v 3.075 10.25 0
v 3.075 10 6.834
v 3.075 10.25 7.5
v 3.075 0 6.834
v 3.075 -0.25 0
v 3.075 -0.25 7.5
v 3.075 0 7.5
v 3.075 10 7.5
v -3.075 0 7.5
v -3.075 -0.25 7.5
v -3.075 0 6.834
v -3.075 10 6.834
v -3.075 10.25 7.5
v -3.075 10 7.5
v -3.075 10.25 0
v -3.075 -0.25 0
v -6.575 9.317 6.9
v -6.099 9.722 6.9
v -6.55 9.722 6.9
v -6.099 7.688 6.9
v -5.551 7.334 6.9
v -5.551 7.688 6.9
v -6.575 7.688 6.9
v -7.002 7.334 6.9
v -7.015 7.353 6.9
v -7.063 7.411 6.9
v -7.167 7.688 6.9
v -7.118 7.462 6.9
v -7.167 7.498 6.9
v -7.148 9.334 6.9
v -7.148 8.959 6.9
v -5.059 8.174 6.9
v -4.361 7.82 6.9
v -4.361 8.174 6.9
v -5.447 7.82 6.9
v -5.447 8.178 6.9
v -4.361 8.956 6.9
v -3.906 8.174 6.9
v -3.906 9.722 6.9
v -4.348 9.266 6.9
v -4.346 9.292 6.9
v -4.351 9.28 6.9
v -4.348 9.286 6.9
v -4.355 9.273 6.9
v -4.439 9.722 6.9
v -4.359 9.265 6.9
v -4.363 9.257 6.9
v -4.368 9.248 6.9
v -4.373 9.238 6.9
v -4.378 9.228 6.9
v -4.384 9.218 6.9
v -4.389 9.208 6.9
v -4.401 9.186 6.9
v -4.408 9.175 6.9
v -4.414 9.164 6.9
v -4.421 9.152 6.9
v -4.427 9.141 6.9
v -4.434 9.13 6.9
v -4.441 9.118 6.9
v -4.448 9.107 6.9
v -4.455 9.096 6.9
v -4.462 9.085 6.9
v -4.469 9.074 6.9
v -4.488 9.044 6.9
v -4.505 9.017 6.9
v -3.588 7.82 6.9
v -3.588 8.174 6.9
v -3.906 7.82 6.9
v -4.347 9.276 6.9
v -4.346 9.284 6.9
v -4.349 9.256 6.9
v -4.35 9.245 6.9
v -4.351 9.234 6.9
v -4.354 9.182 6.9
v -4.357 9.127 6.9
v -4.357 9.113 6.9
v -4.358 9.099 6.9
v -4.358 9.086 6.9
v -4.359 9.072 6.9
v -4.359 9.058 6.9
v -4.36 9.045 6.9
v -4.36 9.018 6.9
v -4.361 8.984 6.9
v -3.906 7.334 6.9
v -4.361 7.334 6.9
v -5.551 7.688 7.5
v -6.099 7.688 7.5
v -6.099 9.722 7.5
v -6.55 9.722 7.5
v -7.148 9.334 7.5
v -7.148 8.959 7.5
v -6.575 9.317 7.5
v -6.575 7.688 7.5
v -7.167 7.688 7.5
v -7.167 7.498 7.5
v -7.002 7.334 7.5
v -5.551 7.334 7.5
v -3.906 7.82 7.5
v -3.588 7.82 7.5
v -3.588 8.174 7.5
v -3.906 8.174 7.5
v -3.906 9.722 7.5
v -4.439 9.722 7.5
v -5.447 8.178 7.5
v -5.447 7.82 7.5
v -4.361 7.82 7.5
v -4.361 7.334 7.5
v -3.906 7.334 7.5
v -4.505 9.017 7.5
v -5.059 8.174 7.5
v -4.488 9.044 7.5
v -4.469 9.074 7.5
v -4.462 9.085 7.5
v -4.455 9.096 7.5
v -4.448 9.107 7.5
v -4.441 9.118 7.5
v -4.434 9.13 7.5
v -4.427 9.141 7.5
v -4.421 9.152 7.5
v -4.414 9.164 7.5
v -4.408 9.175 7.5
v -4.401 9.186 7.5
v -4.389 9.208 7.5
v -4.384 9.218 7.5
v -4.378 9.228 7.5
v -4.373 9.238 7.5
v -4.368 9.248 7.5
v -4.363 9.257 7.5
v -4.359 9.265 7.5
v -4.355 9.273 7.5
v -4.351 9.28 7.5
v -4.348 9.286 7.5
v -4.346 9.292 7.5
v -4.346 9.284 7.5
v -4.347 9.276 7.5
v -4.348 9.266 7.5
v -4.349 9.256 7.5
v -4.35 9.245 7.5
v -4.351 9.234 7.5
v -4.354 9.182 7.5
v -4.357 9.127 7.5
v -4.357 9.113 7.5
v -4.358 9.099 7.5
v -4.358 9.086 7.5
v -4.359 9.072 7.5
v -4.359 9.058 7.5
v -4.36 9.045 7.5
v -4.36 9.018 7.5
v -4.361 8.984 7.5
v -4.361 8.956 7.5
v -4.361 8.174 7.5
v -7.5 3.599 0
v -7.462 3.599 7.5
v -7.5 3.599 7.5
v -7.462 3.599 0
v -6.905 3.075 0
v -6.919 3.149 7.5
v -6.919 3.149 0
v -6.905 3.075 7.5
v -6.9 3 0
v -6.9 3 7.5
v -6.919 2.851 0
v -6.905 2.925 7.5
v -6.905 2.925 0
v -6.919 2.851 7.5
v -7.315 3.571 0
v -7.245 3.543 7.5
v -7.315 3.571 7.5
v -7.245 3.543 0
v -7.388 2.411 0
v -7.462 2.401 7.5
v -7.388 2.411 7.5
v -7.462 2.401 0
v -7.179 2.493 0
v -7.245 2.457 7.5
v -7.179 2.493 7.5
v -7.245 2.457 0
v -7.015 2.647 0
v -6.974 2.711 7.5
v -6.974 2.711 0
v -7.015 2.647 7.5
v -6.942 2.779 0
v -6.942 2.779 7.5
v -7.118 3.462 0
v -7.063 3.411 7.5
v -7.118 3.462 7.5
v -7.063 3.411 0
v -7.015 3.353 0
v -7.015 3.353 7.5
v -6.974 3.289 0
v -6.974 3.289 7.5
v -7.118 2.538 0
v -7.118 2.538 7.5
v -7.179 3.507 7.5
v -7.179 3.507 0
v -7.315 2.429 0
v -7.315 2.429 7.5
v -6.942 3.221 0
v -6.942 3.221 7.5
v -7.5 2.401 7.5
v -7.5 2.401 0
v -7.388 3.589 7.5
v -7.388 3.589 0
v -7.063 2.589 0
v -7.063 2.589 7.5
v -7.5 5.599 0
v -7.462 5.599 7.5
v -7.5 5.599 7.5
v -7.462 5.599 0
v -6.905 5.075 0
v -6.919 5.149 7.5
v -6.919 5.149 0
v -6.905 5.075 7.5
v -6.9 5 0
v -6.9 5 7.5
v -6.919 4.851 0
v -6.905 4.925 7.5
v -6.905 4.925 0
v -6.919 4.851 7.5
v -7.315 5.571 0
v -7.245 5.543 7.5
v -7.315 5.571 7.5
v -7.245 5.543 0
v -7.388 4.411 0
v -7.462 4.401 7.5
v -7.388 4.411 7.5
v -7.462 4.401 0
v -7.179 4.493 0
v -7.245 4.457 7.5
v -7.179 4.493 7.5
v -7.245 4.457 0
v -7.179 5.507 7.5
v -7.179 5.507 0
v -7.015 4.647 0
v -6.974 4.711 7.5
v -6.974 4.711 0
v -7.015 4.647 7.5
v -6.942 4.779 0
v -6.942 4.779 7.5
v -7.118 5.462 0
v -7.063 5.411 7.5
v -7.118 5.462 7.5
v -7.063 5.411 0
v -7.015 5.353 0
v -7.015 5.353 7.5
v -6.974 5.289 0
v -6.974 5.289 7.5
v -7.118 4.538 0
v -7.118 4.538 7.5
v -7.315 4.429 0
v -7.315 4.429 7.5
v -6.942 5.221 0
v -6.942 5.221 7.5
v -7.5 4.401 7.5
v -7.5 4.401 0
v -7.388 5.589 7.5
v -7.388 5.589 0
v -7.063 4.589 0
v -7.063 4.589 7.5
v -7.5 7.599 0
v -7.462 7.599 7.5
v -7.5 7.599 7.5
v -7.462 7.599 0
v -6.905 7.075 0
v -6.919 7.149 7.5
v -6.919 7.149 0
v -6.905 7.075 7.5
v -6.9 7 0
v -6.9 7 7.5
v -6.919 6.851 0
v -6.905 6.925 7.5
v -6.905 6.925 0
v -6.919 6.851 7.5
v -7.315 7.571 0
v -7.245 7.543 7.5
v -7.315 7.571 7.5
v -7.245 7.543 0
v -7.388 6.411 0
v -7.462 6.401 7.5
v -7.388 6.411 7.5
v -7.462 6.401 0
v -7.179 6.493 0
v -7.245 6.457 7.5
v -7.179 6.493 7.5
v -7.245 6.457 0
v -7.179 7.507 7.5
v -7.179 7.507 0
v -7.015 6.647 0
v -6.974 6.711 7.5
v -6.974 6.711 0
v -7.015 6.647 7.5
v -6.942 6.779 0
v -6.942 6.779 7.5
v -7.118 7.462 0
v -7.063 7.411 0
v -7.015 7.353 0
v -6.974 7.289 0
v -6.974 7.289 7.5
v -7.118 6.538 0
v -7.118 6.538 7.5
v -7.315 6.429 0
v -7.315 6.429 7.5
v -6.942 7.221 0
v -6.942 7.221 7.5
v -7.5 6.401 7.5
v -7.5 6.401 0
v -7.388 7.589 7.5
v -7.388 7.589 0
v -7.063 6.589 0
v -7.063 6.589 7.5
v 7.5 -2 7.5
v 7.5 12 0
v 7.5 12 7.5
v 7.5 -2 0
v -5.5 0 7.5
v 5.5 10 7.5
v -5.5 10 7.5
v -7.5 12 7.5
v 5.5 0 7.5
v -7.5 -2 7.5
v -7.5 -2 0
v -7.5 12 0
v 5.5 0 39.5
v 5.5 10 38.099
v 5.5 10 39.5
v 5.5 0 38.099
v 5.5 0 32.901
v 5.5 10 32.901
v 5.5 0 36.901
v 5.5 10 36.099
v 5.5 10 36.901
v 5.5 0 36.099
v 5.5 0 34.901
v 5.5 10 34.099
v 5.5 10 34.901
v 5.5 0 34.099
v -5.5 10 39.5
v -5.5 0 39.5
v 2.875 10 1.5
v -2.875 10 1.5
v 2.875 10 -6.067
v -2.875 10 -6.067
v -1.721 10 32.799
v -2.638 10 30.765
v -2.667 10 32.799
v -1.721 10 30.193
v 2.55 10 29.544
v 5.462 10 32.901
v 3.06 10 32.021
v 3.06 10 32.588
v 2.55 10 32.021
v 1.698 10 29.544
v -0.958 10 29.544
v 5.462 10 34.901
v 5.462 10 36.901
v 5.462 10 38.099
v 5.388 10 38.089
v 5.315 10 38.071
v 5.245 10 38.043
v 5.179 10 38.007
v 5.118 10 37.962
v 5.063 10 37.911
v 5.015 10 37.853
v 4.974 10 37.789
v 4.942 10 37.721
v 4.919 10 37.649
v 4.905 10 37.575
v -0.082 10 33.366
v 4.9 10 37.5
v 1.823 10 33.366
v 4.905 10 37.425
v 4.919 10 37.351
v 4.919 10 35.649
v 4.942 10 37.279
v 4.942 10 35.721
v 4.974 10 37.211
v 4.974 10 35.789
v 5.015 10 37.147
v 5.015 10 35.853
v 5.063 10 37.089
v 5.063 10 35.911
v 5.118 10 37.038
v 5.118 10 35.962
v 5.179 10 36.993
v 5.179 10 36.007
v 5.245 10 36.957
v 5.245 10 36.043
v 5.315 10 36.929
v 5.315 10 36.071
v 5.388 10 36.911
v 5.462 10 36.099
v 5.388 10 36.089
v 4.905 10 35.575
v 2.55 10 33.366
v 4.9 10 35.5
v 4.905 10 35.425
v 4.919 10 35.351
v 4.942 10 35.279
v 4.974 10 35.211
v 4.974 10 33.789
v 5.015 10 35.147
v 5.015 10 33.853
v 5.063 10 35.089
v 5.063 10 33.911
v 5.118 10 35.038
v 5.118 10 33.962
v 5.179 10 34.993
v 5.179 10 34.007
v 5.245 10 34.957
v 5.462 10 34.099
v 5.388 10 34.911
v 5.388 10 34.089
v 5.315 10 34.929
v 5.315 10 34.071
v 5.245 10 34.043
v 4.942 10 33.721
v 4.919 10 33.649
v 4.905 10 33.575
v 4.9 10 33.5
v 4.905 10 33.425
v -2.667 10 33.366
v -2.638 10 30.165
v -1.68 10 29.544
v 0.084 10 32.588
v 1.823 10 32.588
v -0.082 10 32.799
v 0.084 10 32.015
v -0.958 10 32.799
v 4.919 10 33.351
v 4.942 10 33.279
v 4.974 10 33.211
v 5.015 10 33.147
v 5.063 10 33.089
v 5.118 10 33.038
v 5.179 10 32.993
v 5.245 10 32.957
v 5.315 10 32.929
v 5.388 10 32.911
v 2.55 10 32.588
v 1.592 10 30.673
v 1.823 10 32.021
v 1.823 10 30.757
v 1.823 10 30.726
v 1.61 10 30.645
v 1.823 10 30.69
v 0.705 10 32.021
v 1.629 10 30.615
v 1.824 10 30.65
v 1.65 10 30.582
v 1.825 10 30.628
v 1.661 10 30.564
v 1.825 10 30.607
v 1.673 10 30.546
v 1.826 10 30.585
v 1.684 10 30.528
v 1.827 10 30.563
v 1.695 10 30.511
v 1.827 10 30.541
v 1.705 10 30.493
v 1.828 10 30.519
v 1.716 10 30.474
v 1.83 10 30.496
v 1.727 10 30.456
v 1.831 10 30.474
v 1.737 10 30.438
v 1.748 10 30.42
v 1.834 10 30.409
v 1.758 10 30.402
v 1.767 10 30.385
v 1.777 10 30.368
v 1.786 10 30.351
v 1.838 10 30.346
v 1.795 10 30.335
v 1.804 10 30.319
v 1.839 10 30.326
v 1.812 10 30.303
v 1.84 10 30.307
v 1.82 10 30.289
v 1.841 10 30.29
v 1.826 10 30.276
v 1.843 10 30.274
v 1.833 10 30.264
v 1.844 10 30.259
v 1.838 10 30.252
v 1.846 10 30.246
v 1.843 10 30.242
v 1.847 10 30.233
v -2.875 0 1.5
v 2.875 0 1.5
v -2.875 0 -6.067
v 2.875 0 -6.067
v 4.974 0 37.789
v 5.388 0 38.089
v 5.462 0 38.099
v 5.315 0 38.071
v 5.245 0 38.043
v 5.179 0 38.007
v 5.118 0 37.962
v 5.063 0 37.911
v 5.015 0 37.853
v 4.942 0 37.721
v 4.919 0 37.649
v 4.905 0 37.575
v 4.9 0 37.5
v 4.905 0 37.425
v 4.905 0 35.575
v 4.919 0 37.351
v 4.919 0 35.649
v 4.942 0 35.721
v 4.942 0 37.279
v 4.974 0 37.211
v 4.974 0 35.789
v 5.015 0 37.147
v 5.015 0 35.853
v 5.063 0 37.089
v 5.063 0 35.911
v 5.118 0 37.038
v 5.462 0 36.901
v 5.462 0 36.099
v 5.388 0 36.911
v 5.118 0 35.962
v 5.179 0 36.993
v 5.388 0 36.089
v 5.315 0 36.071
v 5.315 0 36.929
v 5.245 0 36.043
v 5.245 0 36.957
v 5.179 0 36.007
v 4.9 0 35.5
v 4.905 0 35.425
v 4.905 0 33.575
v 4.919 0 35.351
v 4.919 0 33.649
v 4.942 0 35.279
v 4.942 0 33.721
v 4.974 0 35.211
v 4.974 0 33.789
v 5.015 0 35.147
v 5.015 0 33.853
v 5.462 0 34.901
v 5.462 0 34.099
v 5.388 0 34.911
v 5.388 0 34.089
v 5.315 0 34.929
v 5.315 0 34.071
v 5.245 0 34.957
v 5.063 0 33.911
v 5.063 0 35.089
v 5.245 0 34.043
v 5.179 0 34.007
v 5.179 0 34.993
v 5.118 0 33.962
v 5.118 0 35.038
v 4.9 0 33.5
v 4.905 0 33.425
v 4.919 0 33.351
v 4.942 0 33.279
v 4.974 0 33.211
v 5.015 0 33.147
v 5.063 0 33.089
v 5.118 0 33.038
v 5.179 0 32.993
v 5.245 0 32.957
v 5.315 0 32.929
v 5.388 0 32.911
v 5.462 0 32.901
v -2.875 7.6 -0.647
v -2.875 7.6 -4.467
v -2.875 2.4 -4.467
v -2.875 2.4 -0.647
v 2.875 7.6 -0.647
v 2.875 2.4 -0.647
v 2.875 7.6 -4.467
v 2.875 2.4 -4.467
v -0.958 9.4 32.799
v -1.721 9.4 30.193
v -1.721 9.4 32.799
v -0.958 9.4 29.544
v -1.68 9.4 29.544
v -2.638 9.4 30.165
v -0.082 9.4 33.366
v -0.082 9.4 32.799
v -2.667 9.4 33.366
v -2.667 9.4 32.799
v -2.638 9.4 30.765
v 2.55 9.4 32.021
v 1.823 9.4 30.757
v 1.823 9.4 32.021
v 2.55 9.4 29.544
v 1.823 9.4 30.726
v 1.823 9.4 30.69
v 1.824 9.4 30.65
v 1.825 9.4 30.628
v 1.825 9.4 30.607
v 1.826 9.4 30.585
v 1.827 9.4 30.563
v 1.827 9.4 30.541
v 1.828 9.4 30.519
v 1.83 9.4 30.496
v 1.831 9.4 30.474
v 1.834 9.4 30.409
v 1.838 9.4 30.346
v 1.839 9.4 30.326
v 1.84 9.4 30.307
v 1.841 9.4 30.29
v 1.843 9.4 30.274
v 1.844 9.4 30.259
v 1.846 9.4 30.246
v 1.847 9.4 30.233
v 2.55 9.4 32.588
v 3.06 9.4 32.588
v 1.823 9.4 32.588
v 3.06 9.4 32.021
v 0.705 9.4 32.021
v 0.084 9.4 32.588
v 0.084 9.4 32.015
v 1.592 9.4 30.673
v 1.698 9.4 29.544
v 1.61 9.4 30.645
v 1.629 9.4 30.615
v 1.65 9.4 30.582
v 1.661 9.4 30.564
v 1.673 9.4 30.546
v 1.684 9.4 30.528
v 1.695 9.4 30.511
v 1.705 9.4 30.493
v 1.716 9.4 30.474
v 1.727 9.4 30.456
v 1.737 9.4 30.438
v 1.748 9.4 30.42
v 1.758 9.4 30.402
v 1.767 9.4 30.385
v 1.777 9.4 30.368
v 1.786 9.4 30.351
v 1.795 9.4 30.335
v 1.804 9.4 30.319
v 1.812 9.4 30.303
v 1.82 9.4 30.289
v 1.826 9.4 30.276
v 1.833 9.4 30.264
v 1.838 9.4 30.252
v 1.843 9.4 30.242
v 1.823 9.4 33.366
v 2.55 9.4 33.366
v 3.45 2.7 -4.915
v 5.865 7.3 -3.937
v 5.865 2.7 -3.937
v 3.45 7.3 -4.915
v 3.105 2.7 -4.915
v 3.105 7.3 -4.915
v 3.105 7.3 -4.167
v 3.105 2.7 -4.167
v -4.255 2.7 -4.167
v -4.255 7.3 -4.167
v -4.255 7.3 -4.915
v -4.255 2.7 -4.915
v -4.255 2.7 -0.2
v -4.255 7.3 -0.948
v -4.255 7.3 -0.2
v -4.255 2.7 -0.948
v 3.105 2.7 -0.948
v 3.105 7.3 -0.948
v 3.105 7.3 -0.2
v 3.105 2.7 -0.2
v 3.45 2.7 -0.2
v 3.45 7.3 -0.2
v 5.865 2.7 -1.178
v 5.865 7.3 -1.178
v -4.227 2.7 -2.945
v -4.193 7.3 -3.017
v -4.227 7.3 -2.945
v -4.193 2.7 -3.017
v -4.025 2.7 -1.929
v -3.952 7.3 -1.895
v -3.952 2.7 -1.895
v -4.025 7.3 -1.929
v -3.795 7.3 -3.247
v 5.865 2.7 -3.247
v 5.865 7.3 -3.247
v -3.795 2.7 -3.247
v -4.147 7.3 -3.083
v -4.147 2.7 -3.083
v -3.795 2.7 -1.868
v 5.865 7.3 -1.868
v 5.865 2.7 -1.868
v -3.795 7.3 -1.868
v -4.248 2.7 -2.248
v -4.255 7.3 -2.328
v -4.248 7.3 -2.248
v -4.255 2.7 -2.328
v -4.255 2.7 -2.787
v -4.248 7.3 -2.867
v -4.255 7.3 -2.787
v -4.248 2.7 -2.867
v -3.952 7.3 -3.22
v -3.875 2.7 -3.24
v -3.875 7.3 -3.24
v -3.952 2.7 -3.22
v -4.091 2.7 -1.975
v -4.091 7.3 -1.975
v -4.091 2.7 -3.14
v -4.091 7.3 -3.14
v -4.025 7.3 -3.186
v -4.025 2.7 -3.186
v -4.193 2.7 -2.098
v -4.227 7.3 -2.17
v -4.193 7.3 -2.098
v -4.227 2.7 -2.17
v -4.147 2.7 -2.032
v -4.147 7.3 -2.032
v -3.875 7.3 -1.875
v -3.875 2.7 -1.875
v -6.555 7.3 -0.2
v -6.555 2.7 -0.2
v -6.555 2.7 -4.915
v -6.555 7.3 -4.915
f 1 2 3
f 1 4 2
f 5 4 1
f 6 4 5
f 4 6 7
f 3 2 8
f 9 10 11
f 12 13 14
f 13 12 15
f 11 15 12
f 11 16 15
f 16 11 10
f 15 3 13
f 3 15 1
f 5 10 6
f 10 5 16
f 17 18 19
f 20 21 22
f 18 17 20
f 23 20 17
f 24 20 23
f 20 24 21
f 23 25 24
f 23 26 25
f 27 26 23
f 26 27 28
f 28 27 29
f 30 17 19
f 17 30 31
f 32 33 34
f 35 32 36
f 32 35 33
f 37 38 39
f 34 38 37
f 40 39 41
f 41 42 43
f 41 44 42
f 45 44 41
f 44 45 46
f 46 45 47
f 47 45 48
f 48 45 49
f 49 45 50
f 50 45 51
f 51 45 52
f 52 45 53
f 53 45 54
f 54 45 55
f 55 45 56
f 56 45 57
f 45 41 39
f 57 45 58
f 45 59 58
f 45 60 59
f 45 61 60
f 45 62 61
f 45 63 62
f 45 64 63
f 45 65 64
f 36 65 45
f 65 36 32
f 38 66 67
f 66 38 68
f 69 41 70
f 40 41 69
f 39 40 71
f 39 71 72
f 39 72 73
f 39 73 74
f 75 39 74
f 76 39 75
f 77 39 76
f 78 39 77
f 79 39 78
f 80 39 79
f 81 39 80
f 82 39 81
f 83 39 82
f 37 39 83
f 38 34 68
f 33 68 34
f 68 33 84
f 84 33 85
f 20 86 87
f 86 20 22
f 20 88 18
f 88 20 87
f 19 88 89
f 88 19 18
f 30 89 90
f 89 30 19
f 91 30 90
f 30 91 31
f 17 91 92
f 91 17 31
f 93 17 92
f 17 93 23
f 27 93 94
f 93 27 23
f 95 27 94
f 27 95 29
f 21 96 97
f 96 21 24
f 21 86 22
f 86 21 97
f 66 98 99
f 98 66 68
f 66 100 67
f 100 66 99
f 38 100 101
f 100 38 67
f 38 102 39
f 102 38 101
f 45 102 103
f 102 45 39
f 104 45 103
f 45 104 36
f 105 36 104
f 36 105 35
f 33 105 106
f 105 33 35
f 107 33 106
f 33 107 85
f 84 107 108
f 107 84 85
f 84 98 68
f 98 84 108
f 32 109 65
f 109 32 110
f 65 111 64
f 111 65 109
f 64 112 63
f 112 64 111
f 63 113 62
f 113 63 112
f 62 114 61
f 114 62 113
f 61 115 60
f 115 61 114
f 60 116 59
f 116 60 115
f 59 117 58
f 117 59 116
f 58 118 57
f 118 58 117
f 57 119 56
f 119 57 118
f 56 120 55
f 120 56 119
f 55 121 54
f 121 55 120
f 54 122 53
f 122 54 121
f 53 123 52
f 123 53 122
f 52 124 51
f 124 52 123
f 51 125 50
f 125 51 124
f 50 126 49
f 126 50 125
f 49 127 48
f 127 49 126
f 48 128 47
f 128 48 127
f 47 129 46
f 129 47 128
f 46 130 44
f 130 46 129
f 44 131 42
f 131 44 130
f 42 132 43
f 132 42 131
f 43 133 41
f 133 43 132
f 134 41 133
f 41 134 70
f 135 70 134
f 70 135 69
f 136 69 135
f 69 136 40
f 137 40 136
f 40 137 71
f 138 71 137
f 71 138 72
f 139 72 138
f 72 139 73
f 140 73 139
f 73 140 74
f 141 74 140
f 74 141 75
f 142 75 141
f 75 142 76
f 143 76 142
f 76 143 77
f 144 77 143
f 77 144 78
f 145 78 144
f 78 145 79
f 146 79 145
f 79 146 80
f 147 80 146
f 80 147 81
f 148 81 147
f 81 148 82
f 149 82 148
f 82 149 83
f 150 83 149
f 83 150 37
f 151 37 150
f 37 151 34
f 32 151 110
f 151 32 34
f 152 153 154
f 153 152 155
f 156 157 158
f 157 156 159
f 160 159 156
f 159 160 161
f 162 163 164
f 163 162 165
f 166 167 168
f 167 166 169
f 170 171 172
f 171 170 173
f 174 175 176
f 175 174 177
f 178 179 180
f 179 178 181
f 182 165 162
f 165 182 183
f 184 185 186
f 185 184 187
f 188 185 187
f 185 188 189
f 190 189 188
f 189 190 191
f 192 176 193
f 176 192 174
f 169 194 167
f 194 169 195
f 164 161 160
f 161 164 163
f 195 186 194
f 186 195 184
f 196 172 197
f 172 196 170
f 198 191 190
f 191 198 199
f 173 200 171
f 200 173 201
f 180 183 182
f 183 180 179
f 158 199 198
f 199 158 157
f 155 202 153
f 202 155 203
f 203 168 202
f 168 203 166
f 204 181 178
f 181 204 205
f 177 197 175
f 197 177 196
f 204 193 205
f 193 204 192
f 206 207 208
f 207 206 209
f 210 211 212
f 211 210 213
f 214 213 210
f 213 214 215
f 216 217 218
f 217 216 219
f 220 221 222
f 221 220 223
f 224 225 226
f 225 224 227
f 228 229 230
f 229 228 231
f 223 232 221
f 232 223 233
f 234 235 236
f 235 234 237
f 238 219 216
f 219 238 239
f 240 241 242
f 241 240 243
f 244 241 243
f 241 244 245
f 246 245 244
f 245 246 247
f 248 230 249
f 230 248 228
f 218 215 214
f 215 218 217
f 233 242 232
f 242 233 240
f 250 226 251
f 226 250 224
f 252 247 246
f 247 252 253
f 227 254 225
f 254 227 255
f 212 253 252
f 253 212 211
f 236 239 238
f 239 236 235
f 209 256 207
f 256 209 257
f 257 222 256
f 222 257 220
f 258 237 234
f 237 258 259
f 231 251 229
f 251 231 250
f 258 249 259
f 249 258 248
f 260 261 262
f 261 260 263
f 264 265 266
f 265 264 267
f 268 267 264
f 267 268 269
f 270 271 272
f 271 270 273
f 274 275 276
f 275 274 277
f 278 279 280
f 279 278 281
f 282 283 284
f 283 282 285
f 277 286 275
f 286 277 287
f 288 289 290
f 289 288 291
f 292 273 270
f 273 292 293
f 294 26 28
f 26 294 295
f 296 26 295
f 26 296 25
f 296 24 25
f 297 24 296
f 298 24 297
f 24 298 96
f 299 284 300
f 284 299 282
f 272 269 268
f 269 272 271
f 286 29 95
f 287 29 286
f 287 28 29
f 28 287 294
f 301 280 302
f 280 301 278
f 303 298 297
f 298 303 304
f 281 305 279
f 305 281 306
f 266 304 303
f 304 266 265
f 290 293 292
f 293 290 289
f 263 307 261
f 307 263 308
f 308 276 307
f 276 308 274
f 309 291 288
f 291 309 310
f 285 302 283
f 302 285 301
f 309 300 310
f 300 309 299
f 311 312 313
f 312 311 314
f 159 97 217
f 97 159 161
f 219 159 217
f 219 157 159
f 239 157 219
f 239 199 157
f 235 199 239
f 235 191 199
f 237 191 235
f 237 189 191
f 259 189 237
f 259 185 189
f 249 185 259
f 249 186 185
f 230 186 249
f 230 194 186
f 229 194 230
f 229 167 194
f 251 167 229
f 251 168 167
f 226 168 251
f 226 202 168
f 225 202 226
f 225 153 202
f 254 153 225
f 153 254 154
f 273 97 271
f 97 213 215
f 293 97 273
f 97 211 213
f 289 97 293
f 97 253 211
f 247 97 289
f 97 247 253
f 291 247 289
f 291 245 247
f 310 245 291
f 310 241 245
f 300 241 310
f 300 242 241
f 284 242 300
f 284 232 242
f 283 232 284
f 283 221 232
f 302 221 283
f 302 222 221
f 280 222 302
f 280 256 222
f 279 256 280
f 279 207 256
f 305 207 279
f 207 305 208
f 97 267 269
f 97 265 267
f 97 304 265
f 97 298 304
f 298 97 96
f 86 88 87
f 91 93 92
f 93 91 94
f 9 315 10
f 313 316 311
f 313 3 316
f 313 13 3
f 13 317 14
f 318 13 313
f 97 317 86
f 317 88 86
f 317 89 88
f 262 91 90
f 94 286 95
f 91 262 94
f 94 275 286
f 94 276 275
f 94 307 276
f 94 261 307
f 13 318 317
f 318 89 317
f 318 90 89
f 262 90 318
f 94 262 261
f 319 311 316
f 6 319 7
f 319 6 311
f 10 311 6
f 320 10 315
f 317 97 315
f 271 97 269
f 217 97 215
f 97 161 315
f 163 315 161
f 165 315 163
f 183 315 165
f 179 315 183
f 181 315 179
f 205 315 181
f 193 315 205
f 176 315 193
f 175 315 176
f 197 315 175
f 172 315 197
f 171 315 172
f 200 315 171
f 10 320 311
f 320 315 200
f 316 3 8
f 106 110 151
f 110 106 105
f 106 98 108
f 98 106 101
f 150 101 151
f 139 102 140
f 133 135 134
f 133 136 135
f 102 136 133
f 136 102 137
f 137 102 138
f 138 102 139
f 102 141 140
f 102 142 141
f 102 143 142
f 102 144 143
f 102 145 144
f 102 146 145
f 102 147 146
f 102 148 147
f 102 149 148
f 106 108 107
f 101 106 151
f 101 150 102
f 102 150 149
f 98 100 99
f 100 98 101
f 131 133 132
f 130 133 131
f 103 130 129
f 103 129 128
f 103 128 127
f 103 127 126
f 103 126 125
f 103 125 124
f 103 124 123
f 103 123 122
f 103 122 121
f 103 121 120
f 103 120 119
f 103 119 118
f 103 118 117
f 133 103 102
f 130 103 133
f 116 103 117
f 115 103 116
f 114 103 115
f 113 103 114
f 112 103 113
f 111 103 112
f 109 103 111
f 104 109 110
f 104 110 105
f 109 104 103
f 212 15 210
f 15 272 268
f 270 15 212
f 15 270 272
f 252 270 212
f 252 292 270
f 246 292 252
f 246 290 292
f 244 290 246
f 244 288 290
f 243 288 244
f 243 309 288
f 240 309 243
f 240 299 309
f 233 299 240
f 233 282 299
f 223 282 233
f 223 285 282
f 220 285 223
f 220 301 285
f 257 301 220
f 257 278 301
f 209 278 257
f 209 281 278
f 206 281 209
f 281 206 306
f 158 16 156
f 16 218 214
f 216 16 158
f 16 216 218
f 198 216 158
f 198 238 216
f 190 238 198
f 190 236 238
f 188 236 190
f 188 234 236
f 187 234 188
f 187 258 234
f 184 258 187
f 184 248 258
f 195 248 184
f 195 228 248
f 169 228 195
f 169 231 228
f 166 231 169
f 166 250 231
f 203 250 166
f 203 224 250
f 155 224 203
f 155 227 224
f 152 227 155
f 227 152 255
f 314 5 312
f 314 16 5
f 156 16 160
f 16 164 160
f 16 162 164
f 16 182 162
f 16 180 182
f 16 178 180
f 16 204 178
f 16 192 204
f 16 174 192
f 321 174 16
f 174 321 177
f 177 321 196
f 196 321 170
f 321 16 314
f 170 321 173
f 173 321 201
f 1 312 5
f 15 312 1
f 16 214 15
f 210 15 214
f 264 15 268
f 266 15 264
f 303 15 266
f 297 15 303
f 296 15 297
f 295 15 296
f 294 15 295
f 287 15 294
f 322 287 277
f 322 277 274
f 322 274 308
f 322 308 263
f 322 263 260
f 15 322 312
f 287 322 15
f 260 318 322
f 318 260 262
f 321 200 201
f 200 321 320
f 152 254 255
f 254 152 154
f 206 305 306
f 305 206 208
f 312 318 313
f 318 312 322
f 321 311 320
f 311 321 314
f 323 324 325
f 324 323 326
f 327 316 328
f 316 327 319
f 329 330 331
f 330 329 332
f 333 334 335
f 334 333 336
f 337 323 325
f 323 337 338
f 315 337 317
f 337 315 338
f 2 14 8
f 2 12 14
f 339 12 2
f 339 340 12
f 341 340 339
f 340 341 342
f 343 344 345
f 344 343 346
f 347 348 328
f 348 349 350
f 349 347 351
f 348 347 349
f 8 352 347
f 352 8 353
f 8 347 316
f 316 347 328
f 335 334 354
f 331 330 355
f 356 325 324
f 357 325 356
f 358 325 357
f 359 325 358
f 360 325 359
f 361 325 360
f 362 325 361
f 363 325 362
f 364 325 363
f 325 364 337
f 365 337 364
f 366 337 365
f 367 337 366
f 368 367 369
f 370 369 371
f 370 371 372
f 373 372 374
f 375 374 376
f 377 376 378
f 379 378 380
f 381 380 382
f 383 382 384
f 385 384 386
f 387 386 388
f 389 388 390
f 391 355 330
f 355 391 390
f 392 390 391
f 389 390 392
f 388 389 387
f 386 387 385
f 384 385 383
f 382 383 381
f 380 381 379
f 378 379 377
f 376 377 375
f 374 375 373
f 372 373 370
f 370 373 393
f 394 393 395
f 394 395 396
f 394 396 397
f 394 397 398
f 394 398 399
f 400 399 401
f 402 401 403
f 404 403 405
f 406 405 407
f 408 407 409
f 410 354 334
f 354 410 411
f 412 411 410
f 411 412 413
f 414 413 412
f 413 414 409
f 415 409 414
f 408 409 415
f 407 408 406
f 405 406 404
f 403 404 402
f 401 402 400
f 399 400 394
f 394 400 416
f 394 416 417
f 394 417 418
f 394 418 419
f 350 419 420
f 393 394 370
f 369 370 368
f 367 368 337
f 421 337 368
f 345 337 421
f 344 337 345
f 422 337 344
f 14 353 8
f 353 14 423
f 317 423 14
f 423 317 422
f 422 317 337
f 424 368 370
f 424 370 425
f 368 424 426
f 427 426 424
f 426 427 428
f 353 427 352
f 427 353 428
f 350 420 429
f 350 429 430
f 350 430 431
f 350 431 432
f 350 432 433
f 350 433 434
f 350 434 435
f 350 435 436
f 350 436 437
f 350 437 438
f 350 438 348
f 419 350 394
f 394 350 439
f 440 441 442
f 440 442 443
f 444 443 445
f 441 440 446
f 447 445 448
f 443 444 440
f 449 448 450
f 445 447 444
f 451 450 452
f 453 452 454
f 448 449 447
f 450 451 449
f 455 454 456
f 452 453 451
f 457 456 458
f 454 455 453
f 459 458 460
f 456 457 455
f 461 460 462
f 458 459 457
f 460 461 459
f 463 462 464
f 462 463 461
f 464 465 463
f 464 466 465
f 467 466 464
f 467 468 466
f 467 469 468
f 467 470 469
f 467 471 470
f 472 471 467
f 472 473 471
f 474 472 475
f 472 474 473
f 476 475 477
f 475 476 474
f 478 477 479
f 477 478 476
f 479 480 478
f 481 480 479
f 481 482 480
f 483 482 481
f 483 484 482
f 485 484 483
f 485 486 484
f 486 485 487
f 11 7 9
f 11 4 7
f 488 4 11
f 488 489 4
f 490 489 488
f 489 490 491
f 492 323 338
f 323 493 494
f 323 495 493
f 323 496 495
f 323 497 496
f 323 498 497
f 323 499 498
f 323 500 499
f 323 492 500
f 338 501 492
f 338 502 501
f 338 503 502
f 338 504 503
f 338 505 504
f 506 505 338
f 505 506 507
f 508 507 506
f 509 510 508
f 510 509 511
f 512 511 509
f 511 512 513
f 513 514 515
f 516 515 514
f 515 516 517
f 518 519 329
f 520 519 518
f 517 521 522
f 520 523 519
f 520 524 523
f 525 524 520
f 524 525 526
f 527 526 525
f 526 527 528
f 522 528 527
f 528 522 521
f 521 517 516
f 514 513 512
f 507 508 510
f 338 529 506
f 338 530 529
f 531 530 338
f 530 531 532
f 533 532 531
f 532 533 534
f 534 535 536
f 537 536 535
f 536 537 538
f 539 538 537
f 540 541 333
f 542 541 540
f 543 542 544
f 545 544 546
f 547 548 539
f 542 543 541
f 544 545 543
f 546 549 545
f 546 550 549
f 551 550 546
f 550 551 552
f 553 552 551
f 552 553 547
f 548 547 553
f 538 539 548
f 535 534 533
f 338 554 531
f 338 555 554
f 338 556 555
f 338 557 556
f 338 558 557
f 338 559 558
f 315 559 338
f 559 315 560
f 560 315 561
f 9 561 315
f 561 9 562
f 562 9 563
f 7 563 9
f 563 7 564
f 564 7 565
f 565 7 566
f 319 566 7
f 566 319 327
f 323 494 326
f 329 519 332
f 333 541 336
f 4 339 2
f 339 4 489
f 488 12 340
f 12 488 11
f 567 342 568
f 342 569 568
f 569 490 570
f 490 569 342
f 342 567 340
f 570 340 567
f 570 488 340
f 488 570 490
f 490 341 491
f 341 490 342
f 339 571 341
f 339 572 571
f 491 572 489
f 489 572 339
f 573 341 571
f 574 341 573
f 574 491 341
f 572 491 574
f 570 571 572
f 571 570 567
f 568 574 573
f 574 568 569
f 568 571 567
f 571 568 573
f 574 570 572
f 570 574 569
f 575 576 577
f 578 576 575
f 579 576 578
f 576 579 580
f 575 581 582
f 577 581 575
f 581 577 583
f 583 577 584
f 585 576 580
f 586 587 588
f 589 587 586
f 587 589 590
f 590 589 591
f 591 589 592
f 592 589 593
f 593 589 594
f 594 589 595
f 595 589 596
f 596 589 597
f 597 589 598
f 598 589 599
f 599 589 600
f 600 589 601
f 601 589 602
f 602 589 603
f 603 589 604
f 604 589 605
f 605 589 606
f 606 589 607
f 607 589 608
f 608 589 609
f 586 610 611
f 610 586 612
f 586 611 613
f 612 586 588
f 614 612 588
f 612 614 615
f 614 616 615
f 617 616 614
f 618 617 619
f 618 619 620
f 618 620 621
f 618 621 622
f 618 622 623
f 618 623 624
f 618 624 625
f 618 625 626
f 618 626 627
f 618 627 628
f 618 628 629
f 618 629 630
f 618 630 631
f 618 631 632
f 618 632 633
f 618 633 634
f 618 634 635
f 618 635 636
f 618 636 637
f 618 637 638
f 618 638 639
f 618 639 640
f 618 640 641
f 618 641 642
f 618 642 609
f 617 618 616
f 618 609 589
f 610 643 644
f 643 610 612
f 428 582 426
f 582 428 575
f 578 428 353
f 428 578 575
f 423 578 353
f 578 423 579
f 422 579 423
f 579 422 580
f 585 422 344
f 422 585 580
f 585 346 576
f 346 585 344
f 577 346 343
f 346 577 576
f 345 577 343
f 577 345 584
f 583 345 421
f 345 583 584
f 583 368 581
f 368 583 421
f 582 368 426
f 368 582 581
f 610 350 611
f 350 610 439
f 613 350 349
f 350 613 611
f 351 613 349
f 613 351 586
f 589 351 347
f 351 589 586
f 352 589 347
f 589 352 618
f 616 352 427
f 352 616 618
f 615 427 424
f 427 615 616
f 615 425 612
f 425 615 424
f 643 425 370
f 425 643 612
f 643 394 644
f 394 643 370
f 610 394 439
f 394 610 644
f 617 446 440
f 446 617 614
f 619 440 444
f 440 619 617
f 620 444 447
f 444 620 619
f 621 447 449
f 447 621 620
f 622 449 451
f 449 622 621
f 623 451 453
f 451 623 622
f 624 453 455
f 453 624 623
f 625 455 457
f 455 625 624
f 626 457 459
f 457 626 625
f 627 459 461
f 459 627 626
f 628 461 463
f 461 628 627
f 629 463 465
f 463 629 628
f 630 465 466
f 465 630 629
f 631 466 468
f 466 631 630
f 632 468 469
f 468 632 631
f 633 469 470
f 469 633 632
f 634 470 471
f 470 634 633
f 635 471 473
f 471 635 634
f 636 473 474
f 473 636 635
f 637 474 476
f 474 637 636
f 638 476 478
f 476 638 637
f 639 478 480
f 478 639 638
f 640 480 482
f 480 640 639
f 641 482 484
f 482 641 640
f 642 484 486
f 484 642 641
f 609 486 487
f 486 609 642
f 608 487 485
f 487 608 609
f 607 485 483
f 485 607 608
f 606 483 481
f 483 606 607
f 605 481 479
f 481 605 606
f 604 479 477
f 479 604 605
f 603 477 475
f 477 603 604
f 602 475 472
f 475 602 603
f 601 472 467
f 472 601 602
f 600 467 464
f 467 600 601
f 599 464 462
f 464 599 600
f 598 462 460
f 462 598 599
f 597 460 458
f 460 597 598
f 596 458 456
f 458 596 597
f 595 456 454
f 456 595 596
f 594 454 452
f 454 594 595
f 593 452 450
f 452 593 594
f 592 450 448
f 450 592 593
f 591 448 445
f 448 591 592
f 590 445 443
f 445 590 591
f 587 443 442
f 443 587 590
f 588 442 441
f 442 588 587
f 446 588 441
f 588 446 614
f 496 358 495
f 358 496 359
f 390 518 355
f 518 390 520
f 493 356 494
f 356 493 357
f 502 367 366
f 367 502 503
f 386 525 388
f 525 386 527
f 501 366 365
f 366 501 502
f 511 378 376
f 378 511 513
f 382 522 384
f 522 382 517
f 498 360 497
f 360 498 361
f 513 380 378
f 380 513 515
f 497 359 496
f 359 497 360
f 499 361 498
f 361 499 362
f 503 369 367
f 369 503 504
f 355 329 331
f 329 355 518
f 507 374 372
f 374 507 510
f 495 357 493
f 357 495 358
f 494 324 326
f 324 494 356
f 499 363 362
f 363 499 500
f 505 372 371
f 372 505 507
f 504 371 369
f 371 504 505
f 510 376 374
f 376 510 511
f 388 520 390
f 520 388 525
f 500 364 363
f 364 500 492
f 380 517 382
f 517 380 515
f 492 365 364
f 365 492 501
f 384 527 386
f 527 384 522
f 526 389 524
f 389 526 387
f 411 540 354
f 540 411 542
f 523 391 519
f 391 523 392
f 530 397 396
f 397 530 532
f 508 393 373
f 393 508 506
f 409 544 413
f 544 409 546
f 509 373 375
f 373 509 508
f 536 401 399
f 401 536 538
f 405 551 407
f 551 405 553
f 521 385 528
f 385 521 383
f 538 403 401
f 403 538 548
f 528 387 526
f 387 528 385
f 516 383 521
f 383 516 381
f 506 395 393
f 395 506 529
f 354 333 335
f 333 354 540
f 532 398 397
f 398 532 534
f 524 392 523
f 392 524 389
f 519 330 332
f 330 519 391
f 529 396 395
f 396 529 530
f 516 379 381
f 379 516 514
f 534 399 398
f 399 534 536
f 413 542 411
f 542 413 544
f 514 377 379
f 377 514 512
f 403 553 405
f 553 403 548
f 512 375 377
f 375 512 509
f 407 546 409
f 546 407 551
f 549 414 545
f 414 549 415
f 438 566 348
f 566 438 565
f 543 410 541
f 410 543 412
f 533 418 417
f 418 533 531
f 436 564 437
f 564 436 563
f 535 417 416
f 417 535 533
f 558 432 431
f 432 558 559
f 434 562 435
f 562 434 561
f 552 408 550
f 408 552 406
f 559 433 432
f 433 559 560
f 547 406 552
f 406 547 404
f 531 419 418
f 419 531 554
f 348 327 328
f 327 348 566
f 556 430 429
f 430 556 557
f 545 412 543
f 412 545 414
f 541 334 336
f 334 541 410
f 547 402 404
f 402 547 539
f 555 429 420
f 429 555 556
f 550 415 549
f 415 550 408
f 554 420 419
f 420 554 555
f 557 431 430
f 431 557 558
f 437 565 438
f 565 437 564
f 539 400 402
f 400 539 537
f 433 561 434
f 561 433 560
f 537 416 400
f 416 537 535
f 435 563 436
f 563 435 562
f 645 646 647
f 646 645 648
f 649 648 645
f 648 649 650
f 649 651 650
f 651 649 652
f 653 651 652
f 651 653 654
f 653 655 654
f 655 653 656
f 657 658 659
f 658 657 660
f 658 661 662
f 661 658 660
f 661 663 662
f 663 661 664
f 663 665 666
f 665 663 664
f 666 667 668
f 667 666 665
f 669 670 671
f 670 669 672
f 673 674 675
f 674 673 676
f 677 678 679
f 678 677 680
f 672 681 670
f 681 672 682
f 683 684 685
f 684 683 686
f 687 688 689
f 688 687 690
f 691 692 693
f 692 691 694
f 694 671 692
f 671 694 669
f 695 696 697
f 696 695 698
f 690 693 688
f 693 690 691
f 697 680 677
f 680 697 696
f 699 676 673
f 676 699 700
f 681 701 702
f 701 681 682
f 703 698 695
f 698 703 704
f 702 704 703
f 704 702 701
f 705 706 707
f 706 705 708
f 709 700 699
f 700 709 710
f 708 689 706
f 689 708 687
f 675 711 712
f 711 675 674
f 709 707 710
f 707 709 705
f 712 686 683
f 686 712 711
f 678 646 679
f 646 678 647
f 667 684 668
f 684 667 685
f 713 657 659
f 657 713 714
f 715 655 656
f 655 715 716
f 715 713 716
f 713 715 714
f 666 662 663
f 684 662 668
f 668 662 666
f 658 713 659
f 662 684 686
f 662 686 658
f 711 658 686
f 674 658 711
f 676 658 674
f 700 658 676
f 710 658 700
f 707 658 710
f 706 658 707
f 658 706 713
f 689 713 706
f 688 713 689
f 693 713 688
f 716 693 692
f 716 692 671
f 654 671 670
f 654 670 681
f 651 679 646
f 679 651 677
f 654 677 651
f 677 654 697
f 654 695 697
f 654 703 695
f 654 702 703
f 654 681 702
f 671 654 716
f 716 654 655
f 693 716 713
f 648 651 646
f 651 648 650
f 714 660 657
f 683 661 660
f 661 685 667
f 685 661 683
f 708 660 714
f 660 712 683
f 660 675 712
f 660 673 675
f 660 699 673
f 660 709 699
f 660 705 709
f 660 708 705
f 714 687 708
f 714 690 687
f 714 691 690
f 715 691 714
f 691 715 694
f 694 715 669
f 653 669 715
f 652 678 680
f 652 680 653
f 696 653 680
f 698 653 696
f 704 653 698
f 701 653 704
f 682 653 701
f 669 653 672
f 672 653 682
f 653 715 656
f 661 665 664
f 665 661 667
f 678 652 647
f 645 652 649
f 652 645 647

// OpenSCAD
$fn = 50;

difference() {
	union() {
		translate(v = [0, 0, 0]) {
			rotate(a = [0, 0, 0]) {
				difference() {
					union() {
						translate(v = [-7.5, -2.0, 0]) {
							cube(size = [15.0, 14.0, 7.5]);
						}
					}
					union() {
						translate(v = [-3.075, -0.25, -0.1]) {
							cube(size = [6.15, 10.5, 7.7]);
						}
						translate(v = [-5.5, 8.5, 6.9]) {
							linear_extrude(height = 0.7) {
								text(font = "Arial:style=Bold", halign = "center", size = 2.5, text = "14", valign = "center");
							}
						}
						translate(v = [-7.5, 3, -0.1]) {
							cylinder(h = 7.7, r = 0.6);
						}
						translate(v = [-7.5, 5, -0.1]) {
							cylinder(h = 7.7, r = 0.6);
						}
						translate(v = [-7.5, 7, -0.1]) {
							cylinder(h = 7.7, r = 0.6);
						}
					}
				}
			}
		}
		translate(v = [0, 0, 7.5]) {
			rotate(a = [0, 0, 0]) {
				difference() {
					union() {
						translate(v = [-5.5, 0, 0]) {
							cube(size = [11.0, 10.0, 32.0]);
						}
						translate(v = [0, 10.0, 0]) {
							rotate(a = [90, 0, 0]) {
								linear_extrude(height = 10.0) {
									polygon(points = [[-2.875, -13.5675], [2.875, -13.5675], [2.875, -6.0], [3.1, 0], [3.1, 0.1], [-3.1, 0.1], [-3.1, 0], [-2.875, -6.0]]);
								}
							}
						}
					}
					union() {
						translate(v = [-2.975, 2.4000000000000004, -11.9675]) {
							cube(size = [5.95, 5.199999999999999, 3.8200000000000003]);
						}
						translate(v = [0, 9.4, 24.0]) {
							rotate(a = [-90, 0, 0]) {
								linear_extrude(height = 0.7) {
									text(font = "Arial:style=Bold", halign = "center", size = 4.0, text = "14", valign = "center");
								}
							}
						}
						translate(v = [5.5, 10.1, 30.0]) {
							rotate(a = [90, 0, 0]) {
								cylinder(h = 10.2, r = 0.6);
							}
						}
						translate(v = [5.5, 10.1, 28.0]) {
							rotate(a = [90, 0, 0]) {
								cylinder(h = 10.2, r = 0.6);
							}
						}
						translate(v = [5.5, 10.1, 26.0]) {
							rotate(a = [90, 0, 0]) {
								cylinder(h = 10.2, r = 0.6);
							}
						}
					}
				}
			}
		}
		translate(v = [0, 2.7, -2.557499999999999]) {
			rotate(a = [0, 0, 0]) {
				difference() {
					union() {
						translate(v = [-6.555, 0, -2.3575]) {
							cube(size = [12.42, 4.6, 4.715]);
						}
					}
					union() {
						translate(v = [0, 4.699999999999999, 0]) {
							rotate(a = [90, 0, 0]) {
								linear_extrude(height = 4.8) {
									polygon(points = [[-4.255, -1.61], [3.105, -1.61], [3.105, -2.3575], [3.45, -2.3575], [5.865, -1.38], [5.965, -1.38], [5.965, -2.4575], [-4.255, -2.4575]]);
								}
							}
						}
						translate(v = [0, 4.699999999999999, 0]) {
							rotate(a = [90, 0, 0]) {
								linear_extrude(height = 4.8) {
									polygon(points = [[-4.255, 1.61], [3.105, 1.61], [3.105, 2.3575], [3.45, 2.3575], [5.865, 1.38], [5.965, 1.38], [5.965, 2.4575], [-4.255, 2.4575]]);
								}
							}
						}
						translate(v = [0, 4.699999999999999, 0]) {
							rotate(a = [90, 0, 0]) {
								linear_extrude(height = 4.8) {
									polygon(points = [[-4.255, 0.23], [-4.248012, 0.309878], [-4.227259, 0.387329], [-4.193372, 0.46], [-4.14738, 0.525682], [-4.090682, 0.58238], [-4.025, 0.628372], [-3.952329, 0.662259], [-3.874878, 0.683012], [-3.795, 0.69], [5.965, 0.69], [5.965, -0.69], [-3.795, -0.69], [-3.874878, -0.683012], [-3.952329, -0.662259], [-4.025, -0.628372], [-4.090682, -0.58238], [-4.14738, -0.525682], [-4.193372, -0.46], [-4.227259, -0.387329], [-4.248012, -0.309878], [-4.255, -0.23]]);
								}
							}
						}
					}
				}
			}
		}
	}
	union();
}
